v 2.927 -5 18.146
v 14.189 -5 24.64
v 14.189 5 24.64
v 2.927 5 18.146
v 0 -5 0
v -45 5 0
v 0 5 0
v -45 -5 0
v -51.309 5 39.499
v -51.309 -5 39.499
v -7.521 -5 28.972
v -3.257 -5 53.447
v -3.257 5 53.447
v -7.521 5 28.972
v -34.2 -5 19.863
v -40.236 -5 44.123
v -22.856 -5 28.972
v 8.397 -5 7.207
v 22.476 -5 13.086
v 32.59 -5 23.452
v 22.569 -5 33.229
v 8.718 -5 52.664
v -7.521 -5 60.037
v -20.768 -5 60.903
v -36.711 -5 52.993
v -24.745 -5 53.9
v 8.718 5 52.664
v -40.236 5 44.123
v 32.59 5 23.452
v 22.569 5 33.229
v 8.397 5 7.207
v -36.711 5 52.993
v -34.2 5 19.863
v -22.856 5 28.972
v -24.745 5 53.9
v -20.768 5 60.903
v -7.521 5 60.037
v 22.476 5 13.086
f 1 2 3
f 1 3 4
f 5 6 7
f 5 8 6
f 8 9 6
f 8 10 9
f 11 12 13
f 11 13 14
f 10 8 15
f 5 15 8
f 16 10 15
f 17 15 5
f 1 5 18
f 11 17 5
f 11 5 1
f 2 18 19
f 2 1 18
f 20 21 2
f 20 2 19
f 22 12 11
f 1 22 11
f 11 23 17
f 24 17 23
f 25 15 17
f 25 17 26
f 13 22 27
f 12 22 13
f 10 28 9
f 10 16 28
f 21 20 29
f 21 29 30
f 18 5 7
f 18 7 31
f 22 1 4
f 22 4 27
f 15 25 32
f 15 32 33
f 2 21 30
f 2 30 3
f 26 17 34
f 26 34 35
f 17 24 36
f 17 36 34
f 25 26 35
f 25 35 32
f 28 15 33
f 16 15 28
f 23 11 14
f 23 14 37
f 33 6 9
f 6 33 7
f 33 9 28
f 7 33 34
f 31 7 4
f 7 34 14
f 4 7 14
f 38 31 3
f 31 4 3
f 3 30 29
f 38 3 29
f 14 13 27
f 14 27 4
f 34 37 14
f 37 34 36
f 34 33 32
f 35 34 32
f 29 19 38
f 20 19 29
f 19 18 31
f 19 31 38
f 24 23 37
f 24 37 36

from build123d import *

# Parameters (mm, degrees)
F1_DEPTH = 5


with BuildPart() as f1:
    # F0 (on Front) → F1 (new body, symmetric)
    with BuildSketch(Plane.XZ):
        Polygon((-45, 0), (0, 0), (8.396735, 7.206781), (22.475777, 13.085932), (32.589957, 23.452093), (22.569422, 33.229049), (14.189174, 24.640019), (2.927364, 18.14605), (8.717845, 52.663731), (-3.256581, 53.446758), (-7.521497, 28.971553), (-7.521497, 60.037153), (-20.767864, 60.903354), (-22.855936, 28.971553), (-24.744828, 53.900092), (-36.710527, 52.993424), (-34.200146, 19.862823), (-40.235602, 44.123352), (-51.308924, 39.499335), align=None)
    extrude(amount=F1_DEPTH, both=True)


solid = f1.part
